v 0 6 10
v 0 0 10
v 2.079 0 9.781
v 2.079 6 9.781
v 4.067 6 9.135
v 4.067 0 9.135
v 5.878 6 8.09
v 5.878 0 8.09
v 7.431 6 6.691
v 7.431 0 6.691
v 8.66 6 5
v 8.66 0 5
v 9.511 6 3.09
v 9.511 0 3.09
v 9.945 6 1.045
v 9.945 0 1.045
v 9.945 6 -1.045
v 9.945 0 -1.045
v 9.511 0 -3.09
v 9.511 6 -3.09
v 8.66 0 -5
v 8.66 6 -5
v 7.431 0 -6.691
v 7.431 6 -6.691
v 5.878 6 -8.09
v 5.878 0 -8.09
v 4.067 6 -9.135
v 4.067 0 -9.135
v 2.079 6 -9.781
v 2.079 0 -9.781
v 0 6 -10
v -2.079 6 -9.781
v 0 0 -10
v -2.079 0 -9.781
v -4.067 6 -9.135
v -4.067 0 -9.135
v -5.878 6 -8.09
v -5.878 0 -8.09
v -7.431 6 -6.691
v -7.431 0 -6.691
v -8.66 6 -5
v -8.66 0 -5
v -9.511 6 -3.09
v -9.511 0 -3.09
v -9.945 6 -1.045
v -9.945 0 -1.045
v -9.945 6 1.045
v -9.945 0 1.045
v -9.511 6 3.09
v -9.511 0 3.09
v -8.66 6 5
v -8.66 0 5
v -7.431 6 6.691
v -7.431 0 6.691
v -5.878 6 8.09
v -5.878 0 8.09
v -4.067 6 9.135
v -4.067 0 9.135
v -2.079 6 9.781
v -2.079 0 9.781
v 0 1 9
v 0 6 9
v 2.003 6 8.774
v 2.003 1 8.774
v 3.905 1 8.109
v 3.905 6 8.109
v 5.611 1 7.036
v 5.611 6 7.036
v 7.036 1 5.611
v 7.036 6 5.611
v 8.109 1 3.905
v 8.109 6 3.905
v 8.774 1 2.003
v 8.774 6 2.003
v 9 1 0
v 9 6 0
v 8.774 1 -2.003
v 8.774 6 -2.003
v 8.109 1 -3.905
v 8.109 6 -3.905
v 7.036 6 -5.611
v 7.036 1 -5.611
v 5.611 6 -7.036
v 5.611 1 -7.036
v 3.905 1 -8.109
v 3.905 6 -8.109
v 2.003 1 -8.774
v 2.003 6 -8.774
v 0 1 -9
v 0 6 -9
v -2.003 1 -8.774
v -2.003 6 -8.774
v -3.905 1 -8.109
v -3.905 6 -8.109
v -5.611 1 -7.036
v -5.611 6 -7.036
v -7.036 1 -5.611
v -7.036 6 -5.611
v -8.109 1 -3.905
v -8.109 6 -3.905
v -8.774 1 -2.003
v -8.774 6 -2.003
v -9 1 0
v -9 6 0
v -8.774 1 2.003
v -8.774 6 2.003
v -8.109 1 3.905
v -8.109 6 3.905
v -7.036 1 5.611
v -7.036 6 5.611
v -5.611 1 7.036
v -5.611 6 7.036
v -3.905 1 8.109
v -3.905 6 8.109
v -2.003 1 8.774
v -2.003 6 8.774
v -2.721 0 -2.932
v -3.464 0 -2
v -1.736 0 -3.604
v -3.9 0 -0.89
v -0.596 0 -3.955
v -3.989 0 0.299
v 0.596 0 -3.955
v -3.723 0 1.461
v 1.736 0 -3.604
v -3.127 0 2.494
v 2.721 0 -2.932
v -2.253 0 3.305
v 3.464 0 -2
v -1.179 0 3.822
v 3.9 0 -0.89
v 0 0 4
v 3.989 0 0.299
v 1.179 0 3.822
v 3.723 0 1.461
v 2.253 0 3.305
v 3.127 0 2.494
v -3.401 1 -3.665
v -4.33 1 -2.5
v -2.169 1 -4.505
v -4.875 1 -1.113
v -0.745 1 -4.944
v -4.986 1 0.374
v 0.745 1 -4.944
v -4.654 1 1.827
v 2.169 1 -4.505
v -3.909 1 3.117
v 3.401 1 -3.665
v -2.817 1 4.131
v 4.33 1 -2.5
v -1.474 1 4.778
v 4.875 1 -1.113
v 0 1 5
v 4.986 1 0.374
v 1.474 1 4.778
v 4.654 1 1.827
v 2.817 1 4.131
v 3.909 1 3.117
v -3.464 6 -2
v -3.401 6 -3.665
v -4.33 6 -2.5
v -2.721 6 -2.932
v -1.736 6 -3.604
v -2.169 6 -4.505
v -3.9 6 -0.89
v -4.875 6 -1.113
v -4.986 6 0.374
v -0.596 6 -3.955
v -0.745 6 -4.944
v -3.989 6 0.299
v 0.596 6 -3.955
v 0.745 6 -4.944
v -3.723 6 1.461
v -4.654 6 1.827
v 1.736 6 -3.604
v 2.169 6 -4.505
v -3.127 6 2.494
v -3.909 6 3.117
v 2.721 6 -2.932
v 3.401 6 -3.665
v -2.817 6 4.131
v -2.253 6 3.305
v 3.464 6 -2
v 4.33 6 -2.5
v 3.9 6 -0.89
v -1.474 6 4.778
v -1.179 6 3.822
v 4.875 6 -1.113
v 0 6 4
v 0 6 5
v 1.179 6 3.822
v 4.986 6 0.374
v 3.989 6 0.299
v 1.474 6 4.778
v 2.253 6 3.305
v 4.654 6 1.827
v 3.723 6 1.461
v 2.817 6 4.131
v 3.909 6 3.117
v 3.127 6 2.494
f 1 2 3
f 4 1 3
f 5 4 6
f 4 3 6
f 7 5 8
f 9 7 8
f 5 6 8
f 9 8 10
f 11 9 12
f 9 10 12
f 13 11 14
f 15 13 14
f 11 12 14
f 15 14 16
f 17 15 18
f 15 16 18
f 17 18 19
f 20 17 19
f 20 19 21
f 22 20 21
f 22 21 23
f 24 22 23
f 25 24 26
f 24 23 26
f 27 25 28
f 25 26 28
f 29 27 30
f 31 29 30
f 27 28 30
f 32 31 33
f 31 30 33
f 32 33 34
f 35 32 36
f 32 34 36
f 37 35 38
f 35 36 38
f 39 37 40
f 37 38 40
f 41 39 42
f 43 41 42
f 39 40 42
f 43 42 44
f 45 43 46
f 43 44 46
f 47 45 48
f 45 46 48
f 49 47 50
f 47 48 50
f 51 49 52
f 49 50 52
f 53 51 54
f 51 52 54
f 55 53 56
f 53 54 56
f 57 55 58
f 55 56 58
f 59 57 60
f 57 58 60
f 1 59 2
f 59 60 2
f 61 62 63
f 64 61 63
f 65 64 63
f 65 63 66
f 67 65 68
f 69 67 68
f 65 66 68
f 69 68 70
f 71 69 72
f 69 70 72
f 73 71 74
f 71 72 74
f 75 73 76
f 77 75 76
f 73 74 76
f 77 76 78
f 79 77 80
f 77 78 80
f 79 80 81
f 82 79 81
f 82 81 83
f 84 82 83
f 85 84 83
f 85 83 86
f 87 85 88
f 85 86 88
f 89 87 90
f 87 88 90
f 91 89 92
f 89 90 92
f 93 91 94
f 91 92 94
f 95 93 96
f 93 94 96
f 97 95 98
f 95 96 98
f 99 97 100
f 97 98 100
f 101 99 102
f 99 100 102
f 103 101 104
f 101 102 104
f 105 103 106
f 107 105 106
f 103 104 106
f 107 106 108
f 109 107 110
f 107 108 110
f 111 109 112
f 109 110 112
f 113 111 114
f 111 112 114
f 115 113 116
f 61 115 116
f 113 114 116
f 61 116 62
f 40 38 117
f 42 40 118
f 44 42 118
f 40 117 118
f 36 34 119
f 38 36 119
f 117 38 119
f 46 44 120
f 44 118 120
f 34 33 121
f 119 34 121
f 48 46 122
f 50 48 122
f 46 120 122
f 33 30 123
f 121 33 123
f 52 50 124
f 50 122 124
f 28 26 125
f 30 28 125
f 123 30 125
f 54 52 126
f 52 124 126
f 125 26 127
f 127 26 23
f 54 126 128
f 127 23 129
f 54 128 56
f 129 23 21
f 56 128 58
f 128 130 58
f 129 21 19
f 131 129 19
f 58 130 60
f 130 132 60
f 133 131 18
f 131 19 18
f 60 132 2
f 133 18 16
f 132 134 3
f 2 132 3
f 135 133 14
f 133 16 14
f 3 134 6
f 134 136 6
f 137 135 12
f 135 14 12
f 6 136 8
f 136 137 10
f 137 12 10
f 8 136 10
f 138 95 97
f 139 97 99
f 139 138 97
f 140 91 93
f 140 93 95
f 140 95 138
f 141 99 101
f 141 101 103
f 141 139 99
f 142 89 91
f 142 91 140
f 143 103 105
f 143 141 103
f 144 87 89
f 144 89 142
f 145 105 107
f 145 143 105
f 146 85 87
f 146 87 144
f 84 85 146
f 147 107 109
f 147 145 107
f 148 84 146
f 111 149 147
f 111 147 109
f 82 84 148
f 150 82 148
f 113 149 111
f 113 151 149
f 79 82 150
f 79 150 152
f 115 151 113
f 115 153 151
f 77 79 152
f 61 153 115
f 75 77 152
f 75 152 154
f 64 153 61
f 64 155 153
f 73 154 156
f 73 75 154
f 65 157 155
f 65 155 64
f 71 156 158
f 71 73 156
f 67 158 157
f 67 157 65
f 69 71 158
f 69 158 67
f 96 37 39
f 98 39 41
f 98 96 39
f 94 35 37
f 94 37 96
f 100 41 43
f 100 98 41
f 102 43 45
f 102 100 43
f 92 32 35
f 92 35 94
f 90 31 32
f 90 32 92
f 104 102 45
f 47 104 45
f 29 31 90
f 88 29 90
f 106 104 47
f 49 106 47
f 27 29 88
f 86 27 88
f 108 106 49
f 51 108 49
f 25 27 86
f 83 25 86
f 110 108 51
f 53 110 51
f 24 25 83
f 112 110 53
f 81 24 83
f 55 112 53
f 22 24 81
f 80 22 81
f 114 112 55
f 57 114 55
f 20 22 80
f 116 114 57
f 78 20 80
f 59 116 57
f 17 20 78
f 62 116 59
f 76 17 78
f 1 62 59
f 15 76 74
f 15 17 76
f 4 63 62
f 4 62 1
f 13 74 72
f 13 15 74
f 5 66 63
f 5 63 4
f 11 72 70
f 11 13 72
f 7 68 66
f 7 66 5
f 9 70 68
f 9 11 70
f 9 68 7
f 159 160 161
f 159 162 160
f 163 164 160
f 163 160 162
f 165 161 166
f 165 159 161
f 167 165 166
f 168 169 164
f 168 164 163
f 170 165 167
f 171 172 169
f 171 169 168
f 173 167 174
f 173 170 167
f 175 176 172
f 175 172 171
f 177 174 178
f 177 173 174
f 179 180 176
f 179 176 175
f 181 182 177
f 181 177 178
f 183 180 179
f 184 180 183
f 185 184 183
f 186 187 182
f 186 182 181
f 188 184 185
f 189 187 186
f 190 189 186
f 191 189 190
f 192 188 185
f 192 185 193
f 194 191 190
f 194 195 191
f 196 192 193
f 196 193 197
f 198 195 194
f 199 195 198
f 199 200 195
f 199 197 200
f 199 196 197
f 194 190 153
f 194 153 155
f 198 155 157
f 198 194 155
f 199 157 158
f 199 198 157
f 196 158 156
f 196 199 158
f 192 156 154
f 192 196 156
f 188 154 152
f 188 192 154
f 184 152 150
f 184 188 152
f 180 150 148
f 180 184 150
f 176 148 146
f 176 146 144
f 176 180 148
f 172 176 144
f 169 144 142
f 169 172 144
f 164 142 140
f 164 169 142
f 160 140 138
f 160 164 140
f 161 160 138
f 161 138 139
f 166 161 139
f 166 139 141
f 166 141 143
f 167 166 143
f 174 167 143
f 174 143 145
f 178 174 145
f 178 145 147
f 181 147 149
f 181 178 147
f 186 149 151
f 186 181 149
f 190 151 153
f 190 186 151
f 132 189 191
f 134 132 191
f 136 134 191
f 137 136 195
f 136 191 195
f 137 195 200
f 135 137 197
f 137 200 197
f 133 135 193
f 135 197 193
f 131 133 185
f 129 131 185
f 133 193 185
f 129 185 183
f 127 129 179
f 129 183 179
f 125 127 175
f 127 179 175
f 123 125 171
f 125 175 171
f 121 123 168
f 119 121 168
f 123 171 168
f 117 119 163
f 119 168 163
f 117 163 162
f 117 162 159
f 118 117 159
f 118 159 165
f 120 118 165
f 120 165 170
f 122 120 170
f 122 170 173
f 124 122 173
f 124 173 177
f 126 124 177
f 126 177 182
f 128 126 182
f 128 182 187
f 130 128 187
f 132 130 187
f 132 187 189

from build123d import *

# Parameters (mm, degrees)
SKETCH1_R            = 10
MAIN_EXTRUSION_DEPTH = 6
SKETCH2_R            = 4
ID_BORE_DEPTH        = 20
SKETCH3_R            = 9
SKETCH3_R_2          = 5
SEAL_RECESS_DEPTH    = 5


with BuildPart() as part:
    # Sketch1 → main extrusion (new body)
    with BuildSketch(Plane(origin=(0, 0, 0), x_dir=(1, 0, 0), z_dir=(0, 1, 0))):
        with Locations(Location((0, 0, 0), (0, 0, 270))):
            Circle(SKETCH1_R)
    extrude(amount=MAIN_EXTRUSION_DEPTH)

    # Sketch2 → ID bore (cut)
    with BuildSketch(Plane(origin=(0, 6, 0), x_dir=(1, 0, 0), z_dir=(0, 1, 0))):
        with Locations(Location((0, 0, 0), (0, 0, 270))):
            Circle(SKETCH2_R)
    extrude(amount=-ID_BORE_DEPTH, mode=Mode.SUBTRACT)

    # Sketch3 → seal recess (cut)
    with BuildSketch(Plane(origin=(0, 6, 0), x_dir=(1, 0, 0), z_dir=(0, 1, 0))):
        with Locations(Location((0, 0, 0), (0, 0, 270))):
            Circle(SKETCH3_R)
        with Locations(Location((0, 0, 0), (0, 0, 270))):
            Circle(SKETCH3_R_2, mode=Mode.SUBTRACT)
    extrude(amount=-SEAL_RECESS_DEPTH, mode=Mode.SUBTRACT)


solid = part.part
